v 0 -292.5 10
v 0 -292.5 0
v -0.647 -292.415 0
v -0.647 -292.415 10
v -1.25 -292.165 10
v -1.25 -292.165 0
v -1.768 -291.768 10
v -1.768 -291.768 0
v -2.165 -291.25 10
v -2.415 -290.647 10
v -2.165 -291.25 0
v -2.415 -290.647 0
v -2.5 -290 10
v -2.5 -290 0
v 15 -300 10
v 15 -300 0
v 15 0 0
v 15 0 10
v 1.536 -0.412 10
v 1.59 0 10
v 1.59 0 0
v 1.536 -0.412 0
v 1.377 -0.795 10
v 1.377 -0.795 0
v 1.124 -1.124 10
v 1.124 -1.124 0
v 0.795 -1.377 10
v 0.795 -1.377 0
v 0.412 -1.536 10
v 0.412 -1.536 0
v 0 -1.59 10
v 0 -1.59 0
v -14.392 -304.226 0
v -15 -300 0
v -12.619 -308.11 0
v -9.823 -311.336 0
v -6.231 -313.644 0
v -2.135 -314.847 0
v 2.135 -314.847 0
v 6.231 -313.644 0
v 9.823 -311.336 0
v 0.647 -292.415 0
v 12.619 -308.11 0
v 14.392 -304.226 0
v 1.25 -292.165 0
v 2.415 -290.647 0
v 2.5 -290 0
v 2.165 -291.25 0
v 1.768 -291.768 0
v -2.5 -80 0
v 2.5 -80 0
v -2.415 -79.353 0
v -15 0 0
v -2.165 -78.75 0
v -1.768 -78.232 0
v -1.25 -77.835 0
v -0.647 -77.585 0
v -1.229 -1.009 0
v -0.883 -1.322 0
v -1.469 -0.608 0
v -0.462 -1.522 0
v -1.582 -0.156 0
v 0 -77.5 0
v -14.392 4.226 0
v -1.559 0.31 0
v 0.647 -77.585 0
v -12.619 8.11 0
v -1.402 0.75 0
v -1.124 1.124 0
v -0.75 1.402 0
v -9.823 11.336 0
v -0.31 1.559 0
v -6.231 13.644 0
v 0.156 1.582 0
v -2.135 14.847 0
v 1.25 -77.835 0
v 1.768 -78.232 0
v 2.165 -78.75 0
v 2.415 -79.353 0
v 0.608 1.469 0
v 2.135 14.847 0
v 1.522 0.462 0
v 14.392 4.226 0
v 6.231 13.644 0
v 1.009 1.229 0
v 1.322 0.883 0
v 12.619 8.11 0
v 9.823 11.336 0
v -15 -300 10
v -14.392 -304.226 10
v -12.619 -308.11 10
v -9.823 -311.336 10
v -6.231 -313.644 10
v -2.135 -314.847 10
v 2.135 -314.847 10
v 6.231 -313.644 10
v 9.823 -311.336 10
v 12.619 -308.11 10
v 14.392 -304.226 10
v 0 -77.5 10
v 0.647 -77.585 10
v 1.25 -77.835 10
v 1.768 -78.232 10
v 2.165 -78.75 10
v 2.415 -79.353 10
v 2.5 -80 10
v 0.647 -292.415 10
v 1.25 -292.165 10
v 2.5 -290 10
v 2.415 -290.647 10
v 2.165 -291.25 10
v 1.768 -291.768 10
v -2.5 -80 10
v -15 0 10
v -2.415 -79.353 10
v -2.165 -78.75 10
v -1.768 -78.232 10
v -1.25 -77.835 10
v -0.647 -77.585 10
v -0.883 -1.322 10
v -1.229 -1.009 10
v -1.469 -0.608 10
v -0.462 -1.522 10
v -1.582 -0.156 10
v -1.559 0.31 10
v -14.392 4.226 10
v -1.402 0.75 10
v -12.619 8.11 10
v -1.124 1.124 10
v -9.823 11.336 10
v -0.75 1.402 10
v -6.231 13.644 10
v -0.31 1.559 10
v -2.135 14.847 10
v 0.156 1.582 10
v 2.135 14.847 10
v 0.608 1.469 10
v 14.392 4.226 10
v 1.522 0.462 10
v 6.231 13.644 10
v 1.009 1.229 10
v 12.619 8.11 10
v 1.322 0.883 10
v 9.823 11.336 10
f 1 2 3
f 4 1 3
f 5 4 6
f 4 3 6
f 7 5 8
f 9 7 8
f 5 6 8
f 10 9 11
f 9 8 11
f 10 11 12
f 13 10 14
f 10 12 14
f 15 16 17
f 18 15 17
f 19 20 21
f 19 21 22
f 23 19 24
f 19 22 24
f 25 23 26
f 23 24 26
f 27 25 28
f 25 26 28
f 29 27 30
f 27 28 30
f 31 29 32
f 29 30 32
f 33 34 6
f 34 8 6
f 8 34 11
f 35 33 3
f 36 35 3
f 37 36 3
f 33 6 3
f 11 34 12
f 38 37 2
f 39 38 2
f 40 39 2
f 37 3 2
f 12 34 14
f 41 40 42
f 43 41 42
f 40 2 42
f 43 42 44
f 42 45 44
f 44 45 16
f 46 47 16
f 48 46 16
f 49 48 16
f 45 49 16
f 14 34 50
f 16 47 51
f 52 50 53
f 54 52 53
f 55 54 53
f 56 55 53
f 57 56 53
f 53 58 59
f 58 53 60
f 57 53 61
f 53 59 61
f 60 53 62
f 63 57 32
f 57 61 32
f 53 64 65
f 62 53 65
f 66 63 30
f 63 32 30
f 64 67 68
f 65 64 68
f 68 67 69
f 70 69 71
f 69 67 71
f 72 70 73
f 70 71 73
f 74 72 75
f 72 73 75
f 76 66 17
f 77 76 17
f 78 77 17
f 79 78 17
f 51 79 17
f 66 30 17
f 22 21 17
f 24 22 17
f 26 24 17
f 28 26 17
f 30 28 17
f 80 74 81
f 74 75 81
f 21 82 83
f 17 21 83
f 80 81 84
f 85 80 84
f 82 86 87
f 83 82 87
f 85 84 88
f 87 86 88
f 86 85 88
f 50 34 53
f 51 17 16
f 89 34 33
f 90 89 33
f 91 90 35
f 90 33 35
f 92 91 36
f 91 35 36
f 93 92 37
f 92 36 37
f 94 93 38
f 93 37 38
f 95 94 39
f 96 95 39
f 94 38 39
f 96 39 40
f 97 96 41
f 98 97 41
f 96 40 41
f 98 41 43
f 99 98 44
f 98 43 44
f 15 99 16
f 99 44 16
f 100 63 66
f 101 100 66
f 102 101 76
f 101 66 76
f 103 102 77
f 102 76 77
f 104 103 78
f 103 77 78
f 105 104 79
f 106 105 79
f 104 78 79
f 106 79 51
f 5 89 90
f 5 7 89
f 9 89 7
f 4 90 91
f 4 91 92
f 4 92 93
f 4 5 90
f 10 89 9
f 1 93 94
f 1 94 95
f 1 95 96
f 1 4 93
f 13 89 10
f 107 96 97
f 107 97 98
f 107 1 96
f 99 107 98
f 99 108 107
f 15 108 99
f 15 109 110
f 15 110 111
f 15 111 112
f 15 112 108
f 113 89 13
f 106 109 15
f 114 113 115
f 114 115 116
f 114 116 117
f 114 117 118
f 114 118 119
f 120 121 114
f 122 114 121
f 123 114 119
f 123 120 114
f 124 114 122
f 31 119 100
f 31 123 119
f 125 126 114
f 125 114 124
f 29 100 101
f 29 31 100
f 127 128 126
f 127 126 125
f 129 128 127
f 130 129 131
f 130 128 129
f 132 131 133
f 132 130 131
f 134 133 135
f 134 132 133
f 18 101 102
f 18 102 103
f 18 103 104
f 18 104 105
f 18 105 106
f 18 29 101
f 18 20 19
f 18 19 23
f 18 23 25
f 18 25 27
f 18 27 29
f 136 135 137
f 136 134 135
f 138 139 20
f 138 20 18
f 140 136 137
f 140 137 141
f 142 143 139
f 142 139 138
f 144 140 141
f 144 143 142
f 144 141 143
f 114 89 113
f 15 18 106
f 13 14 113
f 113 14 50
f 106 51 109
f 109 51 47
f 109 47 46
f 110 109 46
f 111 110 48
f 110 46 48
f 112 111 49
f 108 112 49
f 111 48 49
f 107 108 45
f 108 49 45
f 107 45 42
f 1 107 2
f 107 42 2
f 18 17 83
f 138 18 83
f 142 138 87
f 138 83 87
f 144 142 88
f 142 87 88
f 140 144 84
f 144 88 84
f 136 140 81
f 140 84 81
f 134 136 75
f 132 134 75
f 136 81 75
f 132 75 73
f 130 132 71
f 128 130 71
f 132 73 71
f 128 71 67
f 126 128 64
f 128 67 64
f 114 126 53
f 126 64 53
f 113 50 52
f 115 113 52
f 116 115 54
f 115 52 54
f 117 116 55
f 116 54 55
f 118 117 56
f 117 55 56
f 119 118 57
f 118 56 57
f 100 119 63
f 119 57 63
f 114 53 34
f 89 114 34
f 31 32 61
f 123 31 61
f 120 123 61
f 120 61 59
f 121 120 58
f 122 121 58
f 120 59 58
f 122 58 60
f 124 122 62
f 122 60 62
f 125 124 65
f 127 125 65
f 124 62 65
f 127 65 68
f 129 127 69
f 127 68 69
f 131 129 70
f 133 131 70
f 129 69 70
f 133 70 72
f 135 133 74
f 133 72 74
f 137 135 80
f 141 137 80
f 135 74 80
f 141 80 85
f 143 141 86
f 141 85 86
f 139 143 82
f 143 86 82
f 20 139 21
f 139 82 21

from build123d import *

# Parameters (mm, degrees)
F1_DEPTH = 10


with BuildPart() as f1:
    # F0 (on Top) → F1 (new body)
    with BuildSketch(Plane.XY):
        with BuildLine():
            ThreePointArc((1.59, 0), (-1.1243, 1.1243), (0, -1.59))
            ThreePointArc((0, -1.59), (1.1243, -1.1243), (1.59, 0))
        make_face()
        with BuildLine():
            ThreePointArc((15, 0), (0, 15), (-15, 0))
            Line((-15, 0), (-15, -300))
            ThreePointArc((-15, -300), (0, -315), (15, -300))
            Line((15, -300), (15, 0))
        make_face()
        with BuildLine():
            ThreePointArc((-2.5, -80), (-1.767767, -78.232233), (0, -77.5))
            ThreePointArc((0, -77.5), (1.767767, -78.232233), (2.5, -80))
            Line((2.5, -80), (2.5, -290))
            ThreePointArc((2.5, -290), (1.767767, -291.767767), (0, -292.5))
            ThreePointArc((0, -292.5), (-1.767767, -291.767767), (-2.5, -290))
            Line((-2.5, -290), (-2.5, -80))
        make_face(mode=Mode.SUBTRACT)
        with BuildLine():
            ThreePointArc((1.59, 0), (1.1243, -1.1243), (0, -1.59))
            ThreePointArc((0, -1.59), (-1.1243, 1.1243), (1.59, 0))
        make_face(mode=Mode.SUBTRACT)
    extrude(amount=F1_DEPTH)


solid = f1.part
